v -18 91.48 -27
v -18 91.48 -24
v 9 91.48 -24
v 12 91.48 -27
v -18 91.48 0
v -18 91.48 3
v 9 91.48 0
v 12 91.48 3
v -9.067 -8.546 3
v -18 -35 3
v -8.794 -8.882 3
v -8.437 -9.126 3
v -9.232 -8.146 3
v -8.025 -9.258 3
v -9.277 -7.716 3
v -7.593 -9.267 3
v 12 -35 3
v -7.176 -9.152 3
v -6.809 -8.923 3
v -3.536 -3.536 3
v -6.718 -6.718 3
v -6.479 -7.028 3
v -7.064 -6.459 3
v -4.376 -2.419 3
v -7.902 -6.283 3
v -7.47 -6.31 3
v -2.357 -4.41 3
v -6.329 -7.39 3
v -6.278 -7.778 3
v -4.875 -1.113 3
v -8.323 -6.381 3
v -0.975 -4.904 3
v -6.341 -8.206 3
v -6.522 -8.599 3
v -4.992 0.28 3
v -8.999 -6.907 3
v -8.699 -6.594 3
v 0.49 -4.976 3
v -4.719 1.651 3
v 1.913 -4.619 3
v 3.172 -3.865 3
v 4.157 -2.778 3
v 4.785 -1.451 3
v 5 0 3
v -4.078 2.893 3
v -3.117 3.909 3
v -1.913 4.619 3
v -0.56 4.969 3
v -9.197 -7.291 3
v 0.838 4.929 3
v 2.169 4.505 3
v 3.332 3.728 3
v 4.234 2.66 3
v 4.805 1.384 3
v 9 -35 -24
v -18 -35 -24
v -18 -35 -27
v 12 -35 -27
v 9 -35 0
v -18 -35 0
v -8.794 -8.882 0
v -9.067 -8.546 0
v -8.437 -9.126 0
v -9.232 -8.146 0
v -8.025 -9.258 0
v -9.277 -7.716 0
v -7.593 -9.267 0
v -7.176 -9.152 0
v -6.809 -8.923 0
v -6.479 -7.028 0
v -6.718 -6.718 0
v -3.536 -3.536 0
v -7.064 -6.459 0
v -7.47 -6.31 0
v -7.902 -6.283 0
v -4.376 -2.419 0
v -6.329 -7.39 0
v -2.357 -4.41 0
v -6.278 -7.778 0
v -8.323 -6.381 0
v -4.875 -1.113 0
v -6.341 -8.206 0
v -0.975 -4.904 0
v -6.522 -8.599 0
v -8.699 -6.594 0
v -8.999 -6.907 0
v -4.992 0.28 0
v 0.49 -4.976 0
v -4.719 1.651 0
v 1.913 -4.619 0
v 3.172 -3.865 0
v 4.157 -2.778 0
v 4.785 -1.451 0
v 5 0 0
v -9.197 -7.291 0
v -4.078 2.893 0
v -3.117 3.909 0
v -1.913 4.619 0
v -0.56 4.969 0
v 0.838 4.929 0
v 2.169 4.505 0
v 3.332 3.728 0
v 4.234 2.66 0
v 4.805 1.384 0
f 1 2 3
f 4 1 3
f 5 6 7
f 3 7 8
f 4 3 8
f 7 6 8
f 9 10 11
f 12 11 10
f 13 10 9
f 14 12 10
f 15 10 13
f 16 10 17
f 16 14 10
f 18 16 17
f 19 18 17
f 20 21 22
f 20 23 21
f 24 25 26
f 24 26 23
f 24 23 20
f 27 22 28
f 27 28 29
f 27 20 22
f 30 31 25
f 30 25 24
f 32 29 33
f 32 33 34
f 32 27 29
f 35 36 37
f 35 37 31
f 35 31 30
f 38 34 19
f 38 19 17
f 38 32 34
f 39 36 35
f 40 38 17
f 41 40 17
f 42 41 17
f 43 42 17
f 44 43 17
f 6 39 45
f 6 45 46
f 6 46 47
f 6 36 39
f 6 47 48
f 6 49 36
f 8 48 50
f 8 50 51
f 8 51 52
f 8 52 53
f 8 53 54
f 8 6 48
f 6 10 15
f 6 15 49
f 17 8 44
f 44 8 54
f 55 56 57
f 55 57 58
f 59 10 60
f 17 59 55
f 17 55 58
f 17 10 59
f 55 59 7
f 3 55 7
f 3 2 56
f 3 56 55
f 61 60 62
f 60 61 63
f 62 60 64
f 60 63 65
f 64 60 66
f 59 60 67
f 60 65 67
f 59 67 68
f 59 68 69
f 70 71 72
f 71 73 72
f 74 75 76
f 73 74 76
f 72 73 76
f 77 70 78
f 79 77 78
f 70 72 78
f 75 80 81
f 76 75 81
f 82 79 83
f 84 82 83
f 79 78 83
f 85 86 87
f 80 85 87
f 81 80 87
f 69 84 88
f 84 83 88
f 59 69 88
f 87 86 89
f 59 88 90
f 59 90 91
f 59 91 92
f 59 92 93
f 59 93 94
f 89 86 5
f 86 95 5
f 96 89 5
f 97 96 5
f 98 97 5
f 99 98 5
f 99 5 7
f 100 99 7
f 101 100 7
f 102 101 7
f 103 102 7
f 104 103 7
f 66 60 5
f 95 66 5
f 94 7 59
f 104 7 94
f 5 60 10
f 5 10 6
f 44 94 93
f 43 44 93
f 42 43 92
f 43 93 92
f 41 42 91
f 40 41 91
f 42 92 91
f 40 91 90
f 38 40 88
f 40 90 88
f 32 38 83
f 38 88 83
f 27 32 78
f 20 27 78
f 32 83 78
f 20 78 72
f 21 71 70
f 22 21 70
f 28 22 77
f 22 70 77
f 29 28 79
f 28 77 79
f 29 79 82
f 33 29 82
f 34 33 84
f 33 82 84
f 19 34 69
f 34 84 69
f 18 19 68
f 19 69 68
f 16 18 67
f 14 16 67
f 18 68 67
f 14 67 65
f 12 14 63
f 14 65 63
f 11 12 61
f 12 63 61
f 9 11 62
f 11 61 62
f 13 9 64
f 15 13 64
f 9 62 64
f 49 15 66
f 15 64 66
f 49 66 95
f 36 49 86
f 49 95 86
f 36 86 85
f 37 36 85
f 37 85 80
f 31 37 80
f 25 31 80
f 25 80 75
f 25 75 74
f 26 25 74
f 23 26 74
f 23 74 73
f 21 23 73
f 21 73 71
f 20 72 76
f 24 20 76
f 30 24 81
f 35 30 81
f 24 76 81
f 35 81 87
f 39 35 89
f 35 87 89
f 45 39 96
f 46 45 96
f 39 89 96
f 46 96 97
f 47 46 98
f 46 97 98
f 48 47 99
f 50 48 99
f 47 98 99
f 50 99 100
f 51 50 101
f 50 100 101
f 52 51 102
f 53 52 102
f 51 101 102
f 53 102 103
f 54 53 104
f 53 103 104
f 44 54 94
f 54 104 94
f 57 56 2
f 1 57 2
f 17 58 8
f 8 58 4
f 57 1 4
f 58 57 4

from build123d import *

# Parameters (mm, degrees)
F0_W     = 30
F0_H     = 126.4803184569
F1_DEPTH = 3
F2_W     = 3
F2_H     = 126.4803184569
F3_DEPTH = 30
F4_START = -24
F4_DEPTH = 3


with BuildPart() as f1:
    # F0 (on Top) → F1 (new body)
    with BuildSketch(Plane.XY):
        with Locations((-3, 28.2401592284)):
            Rectangle(F0_W, F0_H)
        with BuildLine():
            ThreePointArc((-6.2781745931, -7.7781745931), (-9.1639938918, -8.3521997416), (-6.7175144213, -6.7175144213))
            ThreePointArc((-6.7175144213, -6.7175144213), (-6.3923552943, -7.2041494445), (-6.2781745931, -7.7781745931))
        make_face(mode=Mode.SUBTRACT)
        with BuildLine():
            ThreePointArc((-3.5355339059, -3.5355339059), (-1.9134171618, 4.6193976626), (5, 0))
            ThreePointArc((5, 0), (1.9134171618, -4.6193976626), (-3.5355339059, -3.5355339059))
        make_face(mode=Mode.SUBTRACT)
    extrude(amount=F1_DEPTH)

    # F2 (on face) → F3 (join)
    with BuildSketch(Plane.XY.offset(3)):
        with Locations((10.5, 28.2401592284)):
            Rectangle(F2_W, F2_H)
    extrude(amount=-F3_DEPTH)

    # F0 (on Top) → F4 (join)
    with BuildSketch(Plane.XY.offset(F4_START)):
        with Locations((-3, 28.2401592284)):
            Rectangle(F0_W, F0_H)
        with BuildLine():
            ThreePointArc((-6.2781745931, -7.7781745931), (-9.1639938918, -8.3521997416), (-6.7175144213, -6.7175144213))
            ThreePointArc((-6.7175144213, -6.7175144213), (-6.3923552943, -7.2041494445), (-6.2781745931, -7.7781745931))
        make_face(mode=Mode.SUBTRACT)
        with BuildLine():
            ThreePointArc((-3.5355339059, -3.5355339059), (-1.9134171618, 4.6193976626), (5, 0))
            ThreePointArc((5, 0), (1.9134171618, -4.6193976626), (-3.5355339059, -3.5355339059))
        make_face(mode=Mode.SUBTRACT)
        with BuildLine():
            ThreePointArc((-3.5355339059, -3.5355339059), (1.9134171618, -4.6193976626), (5, 0))
            ThreePointArc((5, 0), (-1.9134171618, 4.6193976626), (-3.5355339059, -3.5355339059))
        make_face()
        with BuildLine():
            ThreePointArc((-6.2781745931, -7.7781745931), (-6.3923552943, -7.2041494445), (-6.7175144213, -6.7175144213))
            ThreePointArc((-6.7175144213, -6.7175144213), (-9.1639938918, -8.3521997416), (-6.2781745931, -7.7781745931))
        make_face()
    extrude(amount=-F4_DEPTH)


solid = f1.part
